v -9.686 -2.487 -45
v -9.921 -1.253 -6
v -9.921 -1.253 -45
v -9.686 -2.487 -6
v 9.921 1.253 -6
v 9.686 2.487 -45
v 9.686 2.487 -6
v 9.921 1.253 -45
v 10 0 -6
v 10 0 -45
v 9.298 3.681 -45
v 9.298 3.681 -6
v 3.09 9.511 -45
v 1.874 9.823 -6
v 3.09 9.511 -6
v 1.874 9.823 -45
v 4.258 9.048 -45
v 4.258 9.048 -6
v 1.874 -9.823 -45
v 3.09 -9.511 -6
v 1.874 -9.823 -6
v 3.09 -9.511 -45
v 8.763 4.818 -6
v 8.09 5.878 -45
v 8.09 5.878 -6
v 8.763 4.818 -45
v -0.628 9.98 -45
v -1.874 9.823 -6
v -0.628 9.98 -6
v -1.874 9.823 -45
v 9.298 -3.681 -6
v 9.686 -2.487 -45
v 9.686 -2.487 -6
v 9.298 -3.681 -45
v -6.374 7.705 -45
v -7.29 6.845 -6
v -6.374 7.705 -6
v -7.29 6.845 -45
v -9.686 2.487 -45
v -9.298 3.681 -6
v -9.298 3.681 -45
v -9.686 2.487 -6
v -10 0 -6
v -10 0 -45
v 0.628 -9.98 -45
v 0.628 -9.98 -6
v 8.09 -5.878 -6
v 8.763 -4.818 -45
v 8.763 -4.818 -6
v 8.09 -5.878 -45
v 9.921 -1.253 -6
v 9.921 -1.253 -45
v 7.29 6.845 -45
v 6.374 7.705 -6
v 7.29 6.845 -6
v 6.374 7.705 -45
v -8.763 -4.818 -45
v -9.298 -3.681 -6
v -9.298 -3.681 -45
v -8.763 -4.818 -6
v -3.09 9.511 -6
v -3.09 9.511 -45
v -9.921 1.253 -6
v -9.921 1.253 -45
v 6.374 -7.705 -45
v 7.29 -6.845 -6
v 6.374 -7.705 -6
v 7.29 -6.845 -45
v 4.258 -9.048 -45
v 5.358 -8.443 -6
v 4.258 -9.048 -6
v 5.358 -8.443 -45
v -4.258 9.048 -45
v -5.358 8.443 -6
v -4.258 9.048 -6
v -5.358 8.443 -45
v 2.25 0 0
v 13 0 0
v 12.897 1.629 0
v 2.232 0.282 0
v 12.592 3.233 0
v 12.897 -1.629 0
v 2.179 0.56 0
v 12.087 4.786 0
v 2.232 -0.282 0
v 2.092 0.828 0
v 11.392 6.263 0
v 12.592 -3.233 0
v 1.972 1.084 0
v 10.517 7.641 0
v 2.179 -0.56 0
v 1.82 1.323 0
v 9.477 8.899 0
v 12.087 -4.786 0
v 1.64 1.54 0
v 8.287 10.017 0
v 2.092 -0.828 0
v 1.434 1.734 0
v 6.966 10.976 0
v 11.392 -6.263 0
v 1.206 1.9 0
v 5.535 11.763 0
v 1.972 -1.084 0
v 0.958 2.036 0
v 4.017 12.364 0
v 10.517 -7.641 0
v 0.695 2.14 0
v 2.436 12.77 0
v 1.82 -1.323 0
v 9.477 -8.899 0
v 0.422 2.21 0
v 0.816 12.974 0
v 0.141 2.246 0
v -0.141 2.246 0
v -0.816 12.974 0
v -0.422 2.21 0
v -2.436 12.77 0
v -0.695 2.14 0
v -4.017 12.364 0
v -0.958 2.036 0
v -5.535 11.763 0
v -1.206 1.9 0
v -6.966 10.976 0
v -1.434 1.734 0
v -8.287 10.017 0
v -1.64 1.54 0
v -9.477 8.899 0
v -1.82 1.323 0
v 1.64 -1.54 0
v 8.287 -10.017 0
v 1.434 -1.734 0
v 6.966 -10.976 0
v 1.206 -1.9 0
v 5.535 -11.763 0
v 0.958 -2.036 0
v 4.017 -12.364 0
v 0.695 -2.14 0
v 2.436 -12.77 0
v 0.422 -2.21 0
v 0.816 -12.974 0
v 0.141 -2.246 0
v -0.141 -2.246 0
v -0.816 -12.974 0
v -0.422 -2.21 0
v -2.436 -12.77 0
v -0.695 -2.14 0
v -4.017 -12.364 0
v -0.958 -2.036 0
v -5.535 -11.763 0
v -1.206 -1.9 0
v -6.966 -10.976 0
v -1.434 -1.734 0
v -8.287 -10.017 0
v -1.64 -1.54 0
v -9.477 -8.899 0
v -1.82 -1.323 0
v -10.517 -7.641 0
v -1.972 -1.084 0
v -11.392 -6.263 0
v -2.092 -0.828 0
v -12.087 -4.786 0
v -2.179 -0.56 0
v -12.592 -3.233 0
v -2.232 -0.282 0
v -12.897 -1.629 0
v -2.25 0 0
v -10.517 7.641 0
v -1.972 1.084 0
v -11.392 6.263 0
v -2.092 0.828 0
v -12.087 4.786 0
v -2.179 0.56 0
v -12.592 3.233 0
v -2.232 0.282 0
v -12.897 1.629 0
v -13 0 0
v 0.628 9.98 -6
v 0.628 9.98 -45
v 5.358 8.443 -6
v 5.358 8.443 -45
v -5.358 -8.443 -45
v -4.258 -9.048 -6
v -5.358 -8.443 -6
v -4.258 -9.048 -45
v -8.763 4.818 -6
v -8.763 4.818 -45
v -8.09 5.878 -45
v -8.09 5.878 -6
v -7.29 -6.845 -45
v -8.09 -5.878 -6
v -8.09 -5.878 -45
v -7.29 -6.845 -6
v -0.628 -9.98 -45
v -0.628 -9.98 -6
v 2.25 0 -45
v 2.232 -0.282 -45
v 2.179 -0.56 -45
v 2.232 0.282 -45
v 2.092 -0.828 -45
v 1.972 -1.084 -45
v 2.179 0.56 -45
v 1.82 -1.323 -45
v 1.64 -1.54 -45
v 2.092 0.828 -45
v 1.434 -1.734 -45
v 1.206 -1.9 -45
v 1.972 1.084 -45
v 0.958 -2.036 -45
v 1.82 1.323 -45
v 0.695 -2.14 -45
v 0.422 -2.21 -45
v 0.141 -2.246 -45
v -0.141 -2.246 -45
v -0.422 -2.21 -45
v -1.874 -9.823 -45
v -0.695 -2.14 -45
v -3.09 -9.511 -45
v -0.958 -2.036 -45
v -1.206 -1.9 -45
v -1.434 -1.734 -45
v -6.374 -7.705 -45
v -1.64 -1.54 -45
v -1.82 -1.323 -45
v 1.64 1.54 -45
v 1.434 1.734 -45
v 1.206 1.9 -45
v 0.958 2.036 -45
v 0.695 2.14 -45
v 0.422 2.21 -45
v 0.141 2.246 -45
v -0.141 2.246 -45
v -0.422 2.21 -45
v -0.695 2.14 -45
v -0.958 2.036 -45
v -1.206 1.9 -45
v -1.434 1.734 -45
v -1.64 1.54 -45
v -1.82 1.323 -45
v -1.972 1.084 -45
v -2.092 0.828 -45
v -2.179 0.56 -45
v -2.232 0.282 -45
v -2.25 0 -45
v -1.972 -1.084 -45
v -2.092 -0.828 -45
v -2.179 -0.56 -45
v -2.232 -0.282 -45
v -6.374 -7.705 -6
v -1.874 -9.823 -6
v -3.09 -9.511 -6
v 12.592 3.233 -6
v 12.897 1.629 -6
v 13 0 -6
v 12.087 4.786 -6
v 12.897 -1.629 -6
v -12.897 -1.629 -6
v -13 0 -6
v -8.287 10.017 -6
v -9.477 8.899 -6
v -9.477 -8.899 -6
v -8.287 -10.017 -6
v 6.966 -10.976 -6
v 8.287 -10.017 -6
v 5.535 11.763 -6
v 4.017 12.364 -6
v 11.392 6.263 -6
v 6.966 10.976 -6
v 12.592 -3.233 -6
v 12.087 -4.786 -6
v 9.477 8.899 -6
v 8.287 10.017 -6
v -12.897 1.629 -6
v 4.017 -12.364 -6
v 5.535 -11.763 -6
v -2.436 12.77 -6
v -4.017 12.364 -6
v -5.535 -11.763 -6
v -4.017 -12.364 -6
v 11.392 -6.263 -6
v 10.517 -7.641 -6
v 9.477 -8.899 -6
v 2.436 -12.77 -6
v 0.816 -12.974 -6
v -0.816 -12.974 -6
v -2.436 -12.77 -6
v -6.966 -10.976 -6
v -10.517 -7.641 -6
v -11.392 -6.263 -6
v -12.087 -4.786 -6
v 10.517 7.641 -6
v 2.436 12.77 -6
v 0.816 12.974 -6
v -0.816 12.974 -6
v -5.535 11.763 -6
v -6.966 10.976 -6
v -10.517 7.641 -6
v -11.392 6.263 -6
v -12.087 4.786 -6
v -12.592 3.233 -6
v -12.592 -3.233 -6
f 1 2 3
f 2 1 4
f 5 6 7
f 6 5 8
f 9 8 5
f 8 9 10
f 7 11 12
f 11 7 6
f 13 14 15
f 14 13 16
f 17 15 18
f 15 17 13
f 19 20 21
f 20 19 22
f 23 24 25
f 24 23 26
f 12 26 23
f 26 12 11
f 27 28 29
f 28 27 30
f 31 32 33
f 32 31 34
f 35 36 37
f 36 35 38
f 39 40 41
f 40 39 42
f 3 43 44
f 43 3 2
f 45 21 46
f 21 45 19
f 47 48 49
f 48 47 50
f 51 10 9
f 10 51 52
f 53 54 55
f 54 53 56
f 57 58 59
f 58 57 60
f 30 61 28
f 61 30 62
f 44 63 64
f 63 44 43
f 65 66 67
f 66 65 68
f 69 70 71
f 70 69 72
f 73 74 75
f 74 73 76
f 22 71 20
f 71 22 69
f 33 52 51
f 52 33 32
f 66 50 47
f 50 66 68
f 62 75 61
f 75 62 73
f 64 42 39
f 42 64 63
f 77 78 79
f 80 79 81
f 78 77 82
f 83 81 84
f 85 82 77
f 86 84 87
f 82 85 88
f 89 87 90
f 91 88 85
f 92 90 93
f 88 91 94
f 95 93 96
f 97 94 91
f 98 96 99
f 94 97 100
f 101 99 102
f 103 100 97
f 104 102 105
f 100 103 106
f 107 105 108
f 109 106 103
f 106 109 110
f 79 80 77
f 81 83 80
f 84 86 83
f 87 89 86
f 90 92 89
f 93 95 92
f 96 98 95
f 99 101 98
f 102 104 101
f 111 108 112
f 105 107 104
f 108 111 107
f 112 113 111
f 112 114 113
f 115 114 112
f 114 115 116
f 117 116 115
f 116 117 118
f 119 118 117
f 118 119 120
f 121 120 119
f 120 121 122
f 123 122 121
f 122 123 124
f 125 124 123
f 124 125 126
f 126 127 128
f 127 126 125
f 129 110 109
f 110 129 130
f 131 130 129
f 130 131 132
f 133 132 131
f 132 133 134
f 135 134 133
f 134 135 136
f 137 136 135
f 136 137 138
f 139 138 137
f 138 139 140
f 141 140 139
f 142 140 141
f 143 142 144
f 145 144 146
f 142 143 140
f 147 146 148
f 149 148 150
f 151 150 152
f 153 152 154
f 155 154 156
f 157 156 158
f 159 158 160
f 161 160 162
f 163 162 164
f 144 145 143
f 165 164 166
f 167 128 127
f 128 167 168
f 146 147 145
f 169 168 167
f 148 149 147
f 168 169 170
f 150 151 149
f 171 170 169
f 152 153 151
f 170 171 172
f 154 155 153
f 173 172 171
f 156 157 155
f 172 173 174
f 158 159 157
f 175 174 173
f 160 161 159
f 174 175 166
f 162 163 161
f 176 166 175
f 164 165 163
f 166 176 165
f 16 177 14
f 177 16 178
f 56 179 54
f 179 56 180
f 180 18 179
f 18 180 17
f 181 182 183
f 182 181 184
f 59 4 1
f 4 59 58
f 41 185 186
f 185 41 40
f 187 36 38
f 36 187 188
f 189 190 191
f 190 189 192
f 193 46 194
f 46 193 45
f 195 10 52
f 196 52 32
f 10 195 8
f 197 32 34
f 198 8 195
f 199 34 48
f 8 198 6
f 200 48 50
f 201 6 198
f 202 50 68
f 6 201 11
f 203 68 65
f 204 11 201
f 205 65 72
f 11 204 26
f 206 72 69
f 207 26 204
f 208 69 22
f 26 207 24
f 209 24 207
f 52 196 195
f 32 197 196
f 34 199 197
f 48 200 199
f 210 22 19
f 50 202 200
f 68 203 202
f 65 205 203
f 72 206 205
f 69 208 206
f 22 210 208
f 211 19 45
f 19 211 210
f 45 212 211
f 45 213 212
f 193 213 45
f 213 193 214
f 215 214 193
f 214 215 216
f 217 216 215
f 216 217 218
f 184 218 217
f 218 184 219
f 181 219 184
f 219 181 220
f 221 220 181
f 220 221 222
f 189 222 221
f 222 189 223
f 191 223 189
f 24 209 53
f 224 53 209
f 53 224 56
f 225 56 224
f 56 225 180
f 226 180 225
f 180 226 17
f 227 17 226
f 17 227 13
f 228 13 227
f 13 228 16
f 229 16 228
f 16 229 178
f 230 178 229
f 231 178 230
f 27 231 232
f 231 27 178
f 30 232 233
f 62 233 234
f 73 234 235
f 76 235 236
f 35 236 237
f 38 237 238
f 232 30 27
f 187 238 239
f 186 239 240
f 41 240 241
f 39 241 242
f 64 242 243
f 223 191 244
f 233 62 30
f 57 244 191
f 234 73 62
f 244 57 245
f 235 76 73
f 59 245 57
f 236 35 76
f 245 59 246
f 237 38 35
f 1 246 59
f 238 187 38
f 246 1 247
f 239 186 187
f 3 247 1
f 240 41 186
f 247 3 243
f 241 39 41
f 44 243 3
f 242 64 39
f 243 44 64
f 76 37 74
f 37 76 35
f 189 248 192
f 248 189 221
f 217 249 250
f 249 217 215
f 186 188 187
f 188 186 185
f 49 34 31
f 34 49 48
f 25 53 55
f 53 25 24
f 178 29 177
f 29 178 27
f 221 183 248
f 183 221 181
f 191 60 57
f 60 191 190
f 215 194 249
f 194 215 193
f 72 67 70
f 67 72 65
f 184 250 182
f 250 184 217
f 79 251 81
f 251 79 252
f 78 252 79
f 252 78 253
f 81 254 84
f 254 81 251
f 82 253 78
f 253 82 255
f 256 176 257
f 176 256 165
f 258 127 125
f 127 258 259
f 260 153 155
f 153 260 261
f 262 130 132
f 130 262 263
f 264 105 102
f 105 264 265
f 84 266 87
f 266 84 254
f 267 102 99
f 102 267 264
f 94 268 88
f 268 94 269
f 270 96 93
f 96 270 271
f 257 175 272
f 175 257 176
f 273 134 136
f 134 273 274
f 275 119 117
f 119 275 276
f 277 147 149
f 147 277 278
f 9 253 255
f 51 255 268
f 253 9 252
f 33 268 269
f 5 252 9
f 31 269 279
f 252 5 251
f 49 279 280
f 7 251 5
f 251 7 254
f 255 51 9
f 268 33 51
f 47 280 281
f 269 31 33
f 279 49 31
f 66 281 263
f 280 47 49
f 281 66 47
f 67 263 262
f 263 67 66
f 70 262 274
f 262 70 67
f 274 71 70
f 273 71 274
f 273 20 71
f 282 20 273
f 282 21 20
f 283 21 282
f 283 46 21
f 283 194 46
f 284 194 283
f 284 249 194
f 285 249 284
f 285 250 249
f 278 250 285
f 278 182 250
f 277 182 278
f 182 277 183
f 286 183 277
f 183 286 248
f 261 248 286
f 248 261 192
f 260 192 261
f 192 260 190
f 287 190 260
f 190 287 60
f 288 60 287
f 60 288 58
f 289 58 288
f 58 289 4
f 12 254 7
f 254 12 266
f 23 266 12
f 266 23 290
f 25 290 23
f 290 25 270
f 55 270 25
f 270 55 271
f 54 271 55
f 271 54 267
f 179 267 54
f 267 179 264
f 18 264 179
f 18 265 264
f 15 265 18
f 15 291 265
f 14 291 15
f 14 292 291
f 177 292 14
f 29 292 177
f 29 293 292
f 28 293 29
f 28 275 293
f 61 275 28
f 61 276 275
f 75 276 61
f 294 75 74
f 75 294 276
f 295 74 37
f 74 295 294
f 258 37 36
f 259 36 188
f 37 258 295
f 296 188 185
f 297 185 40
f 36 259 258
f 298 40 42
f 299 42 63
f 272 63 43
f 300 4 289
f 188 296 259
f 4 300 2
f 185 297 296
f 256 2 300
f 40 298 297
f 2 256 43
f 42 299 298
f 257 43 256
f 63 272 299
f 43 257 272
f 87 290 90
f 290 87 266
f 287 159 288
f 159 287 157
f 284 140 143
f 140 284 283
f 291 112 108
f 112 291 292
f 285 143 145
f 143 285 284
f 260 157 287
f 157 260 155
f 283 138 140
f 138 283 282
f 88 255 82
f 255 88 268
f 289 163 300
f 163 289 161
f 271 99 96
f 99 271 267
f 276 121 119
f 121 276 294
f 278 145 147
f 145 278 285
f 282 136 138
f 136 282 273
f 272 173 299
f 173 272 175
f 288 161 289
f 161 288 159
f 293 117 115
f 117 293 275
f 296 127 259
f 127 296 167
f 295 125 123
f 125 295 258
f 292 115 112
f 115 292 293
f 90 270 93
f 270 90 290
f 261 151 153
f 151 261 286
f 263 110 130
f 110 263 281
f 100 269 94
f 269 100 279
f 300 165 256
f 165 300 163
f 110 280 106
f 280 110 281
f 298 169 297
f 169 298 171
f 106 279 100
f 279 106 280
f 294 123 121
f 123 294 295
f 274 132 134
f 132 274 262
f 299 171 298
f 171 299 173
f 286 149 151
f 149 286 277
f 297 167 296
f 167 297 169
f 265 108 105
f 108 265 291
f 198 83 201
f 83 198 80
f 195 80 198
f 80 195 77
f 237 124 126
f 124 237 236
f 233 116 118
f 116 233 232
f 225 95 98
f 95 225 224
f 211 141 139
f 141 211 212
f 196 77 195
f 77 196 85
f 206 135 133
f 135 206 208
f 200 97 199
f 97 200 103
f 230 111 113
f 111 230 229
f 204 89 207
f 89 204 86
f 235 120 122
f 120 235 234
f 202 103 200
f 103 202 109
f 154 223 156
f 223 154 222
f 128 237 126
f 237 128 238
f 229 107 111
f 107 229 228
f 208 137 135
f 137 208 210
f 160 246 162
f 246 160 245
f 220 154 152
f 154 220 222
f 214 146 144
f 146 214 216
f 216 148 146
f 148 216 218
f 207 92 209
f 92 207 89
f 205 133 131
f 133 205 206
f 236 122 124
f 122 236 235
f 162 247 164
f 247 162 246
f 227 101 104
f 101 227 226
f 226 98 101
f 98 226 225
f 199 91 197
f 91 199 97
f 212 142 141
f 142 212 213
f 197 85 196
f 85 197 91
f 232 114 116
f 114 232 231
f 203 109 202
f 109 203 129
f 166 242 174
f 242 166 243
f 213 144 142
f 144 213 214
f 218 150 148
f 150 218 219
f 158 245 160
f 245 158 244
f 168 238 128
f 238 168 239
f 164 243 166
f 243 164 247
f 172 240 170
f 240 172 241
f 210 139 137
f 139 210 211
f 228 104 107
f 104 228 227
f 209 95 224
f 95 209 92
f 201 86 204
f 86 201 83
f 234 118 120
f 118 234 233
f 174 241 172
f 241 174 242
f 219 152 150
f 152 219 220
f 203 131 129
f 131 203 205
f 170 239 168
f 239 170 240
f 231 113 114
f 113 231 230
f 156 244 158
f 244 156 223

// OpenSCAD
$fn = 50;


difference() {
	union() {
		translate(v = [0, 0, -45.0000000000]) {
			cylinder(h = 45, r = 10.0000000000);
		}
		translate(v = [0, 0, -6.0000000000]) {
			cylinder(h = 6, r = 13.0000000000);
		}
	}
	union() {
		#translate(v = [0, 0, -45]) {
			cylinder(h = 45, r = 2.2500000000);
		}
	}
}
